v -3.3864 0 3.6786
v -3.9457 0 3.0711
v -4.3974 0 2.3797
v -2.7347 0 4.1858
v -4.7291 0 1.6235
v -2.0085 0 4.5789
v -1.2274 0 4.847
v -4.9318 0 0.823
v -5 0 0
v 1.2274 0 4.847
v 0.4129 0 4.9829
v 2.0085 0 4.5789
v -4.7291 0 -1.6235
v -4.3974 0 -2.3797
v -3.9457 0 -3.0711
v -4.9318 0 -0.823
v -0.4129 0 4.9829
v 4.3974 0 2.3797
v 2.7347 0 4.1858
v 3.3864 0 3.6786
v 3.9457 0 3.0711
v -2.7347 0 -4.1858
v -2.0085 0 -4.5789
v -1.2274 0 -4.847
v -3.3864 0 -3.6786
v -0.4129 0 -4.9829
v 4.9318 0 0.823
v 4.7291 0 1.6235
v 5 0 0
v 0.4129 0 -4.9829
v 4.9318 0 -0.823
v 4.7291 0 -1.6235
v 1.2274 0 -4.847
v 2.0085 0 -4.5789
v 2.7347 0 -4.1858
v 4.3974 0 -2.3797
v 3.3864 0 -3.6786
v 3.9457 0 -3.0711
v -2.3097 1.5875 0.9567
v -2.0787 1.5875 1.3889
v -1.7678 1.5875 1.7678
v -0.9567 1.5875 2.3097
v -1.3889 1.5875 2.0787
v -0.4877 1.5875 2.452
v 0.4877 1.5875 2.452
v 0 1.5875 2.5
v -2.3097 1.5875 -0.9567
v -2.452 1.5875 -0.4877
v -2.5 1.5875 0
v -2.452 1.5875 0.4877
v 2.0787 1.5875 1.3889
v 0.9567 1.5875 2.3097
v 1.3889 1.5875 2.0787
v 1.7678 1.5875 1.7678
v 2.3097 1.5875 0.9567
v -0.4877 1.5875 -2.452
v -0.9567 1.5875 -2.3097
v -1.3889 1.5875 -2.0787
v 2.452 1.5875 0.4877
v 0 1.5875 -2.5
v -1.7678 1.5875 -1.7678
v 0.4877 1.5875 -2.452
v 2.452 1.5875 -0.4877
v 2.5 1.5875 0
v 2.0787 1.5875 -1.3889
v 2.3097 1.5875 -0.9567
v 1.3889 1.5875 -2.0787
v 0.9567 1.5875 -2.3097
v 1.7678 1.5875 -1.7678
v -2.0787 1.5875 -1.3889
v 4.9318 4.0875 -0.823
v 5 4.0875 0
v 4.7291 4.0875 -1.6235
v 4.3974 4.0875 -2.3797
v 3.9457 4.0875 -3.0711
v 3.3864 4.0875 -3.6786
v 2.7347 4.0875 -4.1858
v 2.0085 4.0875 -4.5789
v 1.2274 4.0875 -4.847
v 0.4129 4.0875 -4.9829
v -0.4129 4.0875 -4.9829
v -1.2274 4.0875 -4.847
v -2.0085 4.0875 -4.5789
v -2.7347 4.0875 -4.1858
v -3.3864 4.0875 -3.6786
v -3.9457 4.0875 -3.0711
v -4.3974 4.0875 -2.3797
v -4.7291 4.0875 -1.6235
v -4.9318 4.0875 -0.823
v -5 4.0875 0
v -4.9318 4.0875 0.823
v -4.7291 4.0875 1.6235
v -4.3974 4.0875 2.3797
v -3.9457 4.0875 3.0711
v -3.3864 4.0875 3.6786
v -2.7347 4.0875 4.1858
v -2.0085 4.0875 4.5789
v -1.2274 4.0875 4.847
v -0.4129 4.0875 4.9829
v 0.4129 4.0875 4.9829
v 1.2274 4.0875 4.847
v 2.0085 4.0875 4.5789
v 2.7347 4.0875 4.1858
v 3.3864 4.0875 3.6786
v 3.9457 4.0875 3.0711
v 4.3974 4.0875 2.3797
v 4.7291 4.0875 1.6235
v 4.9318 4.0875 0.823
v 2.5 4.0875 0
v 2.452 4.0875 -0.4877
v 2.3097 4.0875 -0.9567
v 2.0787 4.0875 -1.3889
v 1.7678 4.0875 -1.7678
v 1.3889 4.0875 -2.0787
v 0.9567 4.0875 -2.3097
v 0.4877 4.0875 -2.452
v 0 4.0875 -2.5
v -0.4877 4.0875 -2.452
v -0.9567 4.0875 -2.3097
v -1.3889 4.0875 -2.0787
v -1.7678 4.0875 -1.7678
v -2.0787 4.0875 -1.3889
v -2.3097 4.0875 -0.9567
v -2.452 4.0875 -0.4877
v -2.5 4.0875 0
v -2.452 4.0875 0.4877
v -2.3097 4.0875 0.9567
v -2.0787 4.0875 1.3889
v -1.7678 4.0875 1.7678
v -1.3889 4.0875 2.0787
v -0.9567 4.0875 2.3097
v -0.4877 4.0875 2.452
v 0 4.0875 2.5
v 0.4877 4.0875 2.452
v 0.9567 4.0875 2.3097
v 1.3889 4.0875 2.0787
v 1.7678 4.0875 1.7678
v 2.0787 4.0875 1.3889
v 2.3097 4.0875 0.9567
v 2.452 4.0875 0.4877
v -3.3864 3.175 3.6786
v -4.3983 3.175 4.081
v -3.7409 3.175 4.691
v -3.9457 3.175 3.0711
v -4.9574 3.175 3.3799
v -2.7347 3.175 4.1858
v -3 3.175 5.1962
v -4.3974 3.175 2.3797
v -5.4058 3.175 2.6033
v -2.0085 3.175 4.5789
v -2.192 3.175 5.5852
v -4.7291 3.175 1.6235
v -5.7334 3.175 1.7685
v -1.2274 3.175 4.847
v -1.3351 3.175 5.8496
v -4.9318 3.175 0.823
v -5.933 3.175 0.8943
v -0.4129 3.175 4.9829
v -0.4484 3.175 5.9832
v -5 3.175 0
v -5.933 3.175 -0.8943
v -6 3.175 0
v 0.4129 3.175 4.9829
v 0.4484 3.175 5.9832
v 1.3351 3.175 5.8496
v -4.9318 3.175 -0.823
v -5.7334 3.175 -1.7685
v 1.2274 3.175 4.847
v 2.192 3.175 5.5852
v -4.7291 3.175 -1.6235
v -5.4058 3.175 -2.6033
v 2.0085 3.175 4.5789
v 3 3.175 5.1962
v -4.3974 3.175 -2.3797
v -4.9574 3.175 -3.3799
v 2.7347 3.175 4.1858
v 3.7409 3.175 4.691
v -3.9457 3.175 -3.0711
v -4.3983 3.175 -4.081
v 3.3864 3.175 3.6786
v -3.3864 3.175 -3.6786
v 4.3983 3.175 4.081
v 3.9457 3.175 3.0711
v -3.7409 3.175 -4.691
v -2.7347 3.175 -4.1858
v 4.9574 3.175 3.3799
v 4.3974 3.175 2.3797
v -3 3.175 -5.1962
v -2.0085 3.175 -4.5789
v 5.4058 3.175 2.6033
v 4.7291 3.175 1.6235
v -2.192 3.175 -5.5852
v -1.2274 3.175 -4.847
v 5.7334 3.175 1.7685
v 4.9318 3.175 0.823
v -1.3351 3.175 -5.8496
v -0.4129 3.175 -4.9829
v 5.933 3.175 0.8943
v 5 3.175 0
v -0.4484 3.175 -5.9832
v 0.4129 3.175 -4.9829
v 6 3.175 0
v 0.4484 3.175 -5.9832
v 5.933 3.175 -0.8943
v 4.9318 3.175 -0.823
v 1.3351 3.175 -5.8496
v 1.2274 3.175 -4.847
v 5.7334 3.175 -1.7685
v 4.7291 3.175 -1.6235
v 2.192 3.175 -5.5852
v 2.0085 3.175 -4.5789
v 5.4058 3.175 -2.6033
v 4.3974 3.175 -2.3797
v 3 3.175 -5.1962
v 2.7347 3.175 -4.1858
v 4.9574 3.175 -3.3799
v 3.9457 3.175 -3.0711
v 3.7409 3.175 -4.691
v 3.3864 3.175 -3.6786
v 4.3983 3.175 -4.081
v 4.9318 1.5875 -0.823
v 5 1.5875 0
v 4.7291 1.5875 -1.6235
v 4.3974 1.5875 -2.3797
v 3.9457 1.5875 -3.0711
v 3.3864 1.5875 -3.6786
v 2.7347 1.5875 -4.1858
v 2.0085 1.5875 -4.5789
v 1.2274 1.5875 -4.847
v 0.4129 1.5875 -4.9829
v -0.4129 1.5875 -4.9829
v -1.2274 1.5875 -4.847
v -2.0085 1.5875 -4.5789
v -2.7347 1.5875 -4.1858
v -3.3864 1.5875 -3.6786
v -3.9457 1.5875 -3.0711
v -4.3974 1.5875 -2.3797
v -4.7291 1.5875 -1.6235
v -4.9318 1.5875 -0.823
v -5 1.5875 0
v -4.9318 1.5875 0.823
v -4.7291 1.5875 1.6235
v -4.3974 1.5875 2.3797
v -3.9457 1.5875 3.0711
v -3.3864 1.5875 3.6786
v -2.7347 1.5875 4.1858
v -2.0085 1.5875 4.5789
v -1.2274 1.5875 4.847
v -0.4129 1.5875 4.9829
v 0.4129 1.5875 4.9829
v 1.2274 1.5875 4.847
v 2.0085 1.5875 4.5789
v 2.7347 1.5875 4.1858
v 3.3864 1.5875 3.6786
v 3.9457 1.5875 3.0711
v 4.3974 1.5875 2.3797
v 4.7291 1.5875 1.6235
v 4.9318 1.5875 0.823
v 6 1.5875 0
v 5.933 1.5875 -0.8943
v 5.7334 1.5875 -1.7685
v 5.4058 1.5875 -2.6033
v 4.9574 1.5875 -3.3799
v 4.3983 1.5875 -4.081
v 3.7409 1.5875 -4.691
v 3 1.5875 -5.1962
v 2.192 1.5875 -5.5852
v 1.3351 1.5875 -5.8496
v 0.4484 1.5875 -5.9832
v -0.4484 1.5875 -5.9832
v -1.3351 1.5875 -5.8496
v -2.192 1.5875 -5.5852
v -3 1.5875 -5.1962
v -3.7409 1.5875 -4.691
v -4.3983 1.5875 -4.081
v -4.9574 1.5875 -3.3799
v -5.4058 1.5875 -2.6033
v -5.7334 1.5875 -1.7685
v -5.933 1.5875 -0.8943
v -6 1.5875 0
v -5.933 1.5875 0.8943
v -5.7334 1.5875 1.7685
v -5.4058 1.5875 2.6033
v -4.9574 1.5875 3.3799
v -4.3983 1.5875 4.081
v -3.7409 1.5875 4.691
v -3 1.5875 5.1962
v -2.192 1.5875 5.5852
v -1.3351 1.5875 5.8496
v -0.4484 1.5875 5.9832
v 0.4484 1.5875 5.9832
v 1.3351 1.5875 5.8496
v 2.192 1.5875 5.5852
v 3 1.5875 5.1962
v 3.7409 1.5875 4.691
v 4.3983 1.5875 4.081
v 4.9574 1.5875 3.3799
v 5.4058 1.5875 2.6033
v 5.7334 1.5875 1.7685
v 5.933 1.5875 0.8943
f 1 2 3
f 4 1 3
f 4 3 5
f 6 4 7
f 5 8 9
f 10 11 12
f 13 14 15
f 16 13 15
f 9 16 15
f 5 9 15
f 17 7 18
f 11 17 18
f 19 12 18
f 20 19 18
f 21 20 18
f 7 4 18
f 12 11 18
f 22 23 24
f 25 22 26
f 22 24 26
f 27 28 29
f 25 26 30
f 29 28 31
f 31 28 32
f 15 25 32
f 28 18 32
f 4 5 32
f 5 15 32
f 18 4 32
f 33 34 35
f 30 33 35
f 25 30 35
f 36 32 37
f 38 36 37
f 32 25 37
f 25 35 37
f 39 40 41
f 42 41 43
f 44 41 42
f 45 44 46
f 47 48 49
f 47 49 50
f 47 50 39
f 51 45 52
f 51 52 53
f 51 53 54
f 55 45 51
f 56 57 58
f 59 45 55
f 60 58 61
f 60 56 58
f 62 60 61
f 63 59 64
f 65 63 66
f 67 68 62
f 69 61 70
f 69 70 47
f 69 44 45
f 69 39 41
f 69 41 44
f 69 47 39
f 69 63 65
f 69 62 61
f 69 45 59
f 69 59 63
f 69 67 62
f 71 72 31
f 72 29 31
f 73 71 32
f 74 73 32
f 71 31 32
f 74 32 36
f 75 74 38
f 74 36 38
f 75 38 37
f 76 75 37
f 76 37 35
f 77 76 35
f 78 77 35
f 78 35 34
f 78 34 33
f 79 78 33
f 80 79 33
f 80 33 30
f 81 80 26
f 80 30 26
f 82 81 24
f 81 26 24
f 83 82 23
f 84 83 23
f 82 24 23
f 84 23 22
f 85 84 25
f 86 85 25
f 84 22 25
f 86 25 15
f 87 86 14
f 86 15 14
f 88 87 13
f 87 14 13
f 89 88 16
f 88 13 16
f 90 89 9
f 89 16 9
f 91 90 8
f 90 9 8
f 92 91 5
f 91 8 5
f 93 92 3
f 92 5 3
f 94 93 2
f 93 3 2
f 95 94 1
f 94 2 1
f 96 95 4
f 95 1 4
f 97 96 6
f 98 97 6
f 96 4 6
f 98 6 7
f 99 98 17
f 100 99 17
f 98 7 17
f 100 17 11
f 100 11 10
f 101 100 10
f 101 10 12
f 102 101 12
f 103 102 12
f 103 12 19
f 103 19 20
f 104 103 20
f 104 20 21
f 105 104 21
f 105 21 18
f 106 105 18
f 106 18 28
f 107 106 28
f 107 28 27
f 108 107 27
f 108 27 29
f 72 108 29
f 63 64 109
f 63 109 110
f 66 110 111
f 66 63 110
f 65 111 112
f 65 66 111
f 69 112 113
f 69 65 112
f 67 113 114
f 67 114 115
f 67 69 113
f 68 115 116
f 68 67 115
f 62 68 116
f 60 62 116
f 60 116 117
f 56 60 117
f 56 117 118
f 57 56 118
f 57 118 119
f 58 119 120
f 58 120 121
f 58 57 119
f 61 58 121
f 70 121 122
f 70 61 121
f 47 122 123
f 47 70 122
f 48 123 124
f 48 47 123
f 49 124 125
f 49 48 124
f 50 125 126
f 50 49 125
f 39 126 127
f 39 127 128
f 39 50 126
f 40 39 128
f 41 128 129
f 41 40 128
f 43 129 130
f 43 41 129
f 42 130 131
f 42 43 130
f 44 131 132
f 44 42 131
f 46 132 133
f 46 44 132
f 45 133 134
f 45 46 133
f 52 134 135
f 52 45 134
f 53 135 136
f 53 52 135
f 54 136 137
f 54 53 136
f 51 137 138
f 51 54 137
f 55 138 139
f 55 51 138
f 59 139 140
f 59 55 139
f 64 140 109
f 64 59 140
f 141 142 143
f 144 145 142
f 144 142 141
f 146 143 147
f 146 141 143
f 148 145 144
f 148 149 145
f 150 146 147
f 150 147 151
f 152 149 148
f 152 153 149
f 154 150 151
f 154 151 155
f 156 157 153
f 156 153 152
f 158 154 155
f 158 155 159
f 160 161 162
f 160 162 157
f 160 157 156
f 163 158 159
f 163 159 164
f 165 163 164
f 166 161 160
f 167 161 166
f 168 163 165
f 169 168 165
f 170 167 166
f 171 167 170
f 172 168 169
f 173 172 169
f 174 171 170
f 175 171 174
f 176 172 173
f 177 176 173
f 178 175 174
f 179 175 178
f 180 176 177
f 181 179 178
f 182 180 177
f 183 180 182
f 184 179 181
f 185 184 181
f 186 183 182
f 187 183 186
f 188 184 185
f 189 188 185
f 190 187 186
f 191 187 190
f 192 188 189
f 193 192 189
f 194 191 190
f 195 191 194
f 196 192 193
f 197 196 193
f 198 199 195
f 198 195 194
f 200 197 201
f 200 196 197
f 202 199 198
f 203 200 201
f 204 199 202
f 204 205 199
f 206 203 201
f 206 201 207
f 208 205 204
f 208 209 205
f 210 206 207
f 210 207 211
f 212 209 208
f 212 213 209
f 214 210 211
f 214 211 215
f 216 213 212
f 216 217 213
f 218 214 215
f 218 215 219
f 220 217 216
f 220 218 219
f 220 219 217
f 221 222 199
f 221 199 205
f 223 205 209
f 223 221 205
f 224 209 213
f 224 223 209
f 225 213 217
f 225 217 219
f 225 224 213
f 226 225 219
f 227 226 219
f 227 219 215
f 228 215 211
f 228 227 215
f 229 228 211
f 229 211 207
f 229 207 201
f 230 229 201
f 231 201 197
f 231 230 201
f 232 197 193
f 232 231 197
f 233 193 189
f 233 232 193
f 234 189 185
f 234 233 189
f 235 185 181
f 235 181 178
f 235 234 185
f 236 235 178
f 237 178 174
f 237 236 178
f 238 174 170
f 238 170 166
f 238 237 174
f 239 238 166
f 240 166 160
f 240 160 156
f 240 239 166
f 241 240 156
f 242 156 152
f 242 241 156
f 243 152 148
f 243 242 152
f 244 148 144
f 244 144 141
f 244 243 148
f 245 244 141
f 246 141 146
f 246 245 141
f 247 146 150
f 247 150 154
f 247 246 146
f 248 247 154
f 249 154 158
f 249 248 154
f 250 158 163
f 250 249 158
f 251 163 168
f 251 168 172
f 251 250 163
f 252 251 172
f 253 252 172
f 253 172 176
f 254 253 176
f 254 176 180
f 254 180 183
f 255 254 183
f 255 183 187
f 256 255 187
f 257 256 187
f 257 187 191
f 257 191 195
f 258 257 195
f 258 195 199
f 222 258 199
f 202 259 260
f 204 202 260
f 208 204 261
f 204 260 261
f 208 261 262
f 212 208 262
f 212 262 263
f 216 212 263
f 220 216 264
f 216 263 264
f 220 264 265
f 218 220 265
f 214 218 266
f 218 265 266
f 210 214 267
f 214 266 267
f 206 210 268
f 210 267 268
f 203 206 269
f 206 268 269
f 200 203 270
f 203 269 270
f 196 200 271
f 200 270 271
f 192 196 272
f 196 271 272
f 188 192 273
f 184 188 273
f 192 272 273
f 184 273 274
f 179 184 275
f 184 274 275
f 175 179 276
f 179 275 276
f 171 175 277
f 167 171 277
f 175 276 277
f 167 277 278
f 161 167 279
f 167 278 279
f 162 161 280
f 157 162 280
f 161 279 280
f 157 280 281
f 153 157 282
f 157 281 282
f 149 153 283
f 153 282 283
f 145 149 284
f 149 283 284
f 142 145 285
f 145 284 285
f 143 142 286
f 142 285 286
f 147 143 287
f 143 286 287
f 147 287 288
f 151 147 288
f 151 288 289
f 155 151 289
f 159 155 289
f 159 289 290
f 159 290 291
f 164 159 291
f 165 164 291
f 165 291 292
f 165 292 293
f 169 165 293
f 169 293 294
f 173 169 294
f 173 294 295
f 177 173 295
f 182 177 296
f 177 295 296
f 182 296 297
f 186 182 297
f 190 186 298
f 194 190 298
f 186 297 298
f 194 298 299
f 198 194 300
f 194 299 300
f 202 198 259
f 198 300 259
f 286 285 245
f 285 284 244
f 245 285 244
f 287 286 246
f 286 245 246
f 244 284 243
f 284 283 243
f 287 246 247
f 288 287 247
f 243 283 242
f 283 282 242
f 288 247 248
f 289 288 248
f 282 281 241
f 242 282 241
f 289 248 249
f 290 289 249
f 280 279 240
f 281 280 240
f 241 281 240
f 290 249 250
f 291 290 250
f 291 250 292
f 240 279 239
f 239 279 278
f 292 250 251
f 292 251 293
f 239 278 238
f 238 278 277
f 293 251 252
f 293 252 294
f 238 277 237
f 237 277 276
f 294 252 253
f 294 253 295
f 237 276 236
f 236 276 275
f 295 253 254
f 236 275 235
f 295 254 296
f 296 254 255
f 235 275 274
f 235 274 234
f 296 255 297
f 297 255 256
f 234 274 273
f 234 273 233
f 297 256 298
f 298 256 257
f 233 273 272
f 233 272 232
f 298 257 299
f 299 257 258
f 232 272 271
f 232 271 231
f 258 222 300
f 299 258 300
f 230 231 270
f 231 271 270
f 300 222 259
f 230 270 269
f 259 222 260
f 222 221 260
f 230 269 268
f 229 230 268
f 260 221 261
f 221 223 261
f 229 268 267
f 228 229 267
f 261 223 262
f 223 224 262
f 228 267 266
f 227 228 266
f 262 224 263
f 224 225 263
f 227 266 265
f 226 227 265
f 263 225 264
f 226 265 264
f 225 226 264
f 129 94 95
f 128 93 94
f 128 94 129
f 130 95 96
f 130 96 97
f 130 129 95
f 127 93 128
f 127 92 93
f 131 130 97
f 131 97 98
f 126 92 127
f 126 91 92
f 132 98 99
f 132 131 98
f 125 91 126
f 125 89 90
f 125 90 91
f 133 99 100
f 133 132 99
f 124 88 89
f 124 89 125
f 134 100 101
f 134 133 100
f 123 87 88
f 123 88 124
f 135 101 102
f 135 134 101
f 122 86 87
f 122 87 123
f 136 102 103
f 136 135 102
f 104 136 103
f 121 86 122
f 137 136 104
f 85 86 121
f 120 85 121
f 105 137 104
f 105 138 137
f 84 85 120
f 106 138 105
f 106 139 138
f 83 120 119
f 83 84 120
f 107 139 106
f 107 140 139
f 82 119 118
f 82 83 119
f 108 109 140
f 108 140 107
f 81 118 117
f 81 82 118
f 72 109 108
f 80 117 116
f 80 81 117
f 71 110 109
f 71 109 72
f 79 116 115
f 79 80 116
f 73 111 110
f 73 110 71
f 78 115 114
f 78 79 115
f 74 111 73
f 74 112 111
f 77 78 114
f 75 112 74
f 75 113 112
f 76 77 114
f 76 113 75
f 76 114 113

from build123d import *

# Parameters (mm, degrees)
SKETCH1_R           = 5
BOSS_EXTRUDE1_DEPTH = 1.5875
SKETCH4_R           = 6
SKETCH4_R_2         = 5
BOSS_EXTRUDE4_DEPTH = 1.5875
SKETCH2_R           = 5
SKETCH2_R_2         = 2.5
BOSS_EXTRUDE2_DEPTH = 2.5


with BuildPart() as part:
    # Sketch1 → Boss-Extrude1 (new body)
    with BuildSketch(Plane(origin=(0, 0, 0), x_dir=(1, 0, 0), z_dir=(0, 1, 0))):
        Circle(SKETCH1_R)
    extrude(amount=BOSS_EXTRUDE1_DEPTH)

    # Sketch2 → Boss-Extrude2 (add)
    with BuildSketch(Plane(origin=(0, 1.5875, 0), x_dir=(1, 0, 0), z_dir=(0, 1, 0))):
        Circle(SKETCH2_R)
        Circle(SKETCH2_R_2, mode=Mode.SUBTRACT)
    extrude(amount=BOSS_EXTRUDE2_DEPTH)


with BuildPart() as body_2:
    # Sketch4 → Boss-Extrude4 (new body)
    with BuildSketch(Plane(origin=(0, 1.5875, 0), x_dir=(1, 0, 0), z_dir=(0, 1, 0))):
        Circle(SKETCH4_R)
        Circle(SKETCH4_R_2, mode=Mode.SUBTRACT)
    extrude(amount=BOSS_EXTRUDE4_DEPTH)


solid = Compound([part.part, body_2.part])
